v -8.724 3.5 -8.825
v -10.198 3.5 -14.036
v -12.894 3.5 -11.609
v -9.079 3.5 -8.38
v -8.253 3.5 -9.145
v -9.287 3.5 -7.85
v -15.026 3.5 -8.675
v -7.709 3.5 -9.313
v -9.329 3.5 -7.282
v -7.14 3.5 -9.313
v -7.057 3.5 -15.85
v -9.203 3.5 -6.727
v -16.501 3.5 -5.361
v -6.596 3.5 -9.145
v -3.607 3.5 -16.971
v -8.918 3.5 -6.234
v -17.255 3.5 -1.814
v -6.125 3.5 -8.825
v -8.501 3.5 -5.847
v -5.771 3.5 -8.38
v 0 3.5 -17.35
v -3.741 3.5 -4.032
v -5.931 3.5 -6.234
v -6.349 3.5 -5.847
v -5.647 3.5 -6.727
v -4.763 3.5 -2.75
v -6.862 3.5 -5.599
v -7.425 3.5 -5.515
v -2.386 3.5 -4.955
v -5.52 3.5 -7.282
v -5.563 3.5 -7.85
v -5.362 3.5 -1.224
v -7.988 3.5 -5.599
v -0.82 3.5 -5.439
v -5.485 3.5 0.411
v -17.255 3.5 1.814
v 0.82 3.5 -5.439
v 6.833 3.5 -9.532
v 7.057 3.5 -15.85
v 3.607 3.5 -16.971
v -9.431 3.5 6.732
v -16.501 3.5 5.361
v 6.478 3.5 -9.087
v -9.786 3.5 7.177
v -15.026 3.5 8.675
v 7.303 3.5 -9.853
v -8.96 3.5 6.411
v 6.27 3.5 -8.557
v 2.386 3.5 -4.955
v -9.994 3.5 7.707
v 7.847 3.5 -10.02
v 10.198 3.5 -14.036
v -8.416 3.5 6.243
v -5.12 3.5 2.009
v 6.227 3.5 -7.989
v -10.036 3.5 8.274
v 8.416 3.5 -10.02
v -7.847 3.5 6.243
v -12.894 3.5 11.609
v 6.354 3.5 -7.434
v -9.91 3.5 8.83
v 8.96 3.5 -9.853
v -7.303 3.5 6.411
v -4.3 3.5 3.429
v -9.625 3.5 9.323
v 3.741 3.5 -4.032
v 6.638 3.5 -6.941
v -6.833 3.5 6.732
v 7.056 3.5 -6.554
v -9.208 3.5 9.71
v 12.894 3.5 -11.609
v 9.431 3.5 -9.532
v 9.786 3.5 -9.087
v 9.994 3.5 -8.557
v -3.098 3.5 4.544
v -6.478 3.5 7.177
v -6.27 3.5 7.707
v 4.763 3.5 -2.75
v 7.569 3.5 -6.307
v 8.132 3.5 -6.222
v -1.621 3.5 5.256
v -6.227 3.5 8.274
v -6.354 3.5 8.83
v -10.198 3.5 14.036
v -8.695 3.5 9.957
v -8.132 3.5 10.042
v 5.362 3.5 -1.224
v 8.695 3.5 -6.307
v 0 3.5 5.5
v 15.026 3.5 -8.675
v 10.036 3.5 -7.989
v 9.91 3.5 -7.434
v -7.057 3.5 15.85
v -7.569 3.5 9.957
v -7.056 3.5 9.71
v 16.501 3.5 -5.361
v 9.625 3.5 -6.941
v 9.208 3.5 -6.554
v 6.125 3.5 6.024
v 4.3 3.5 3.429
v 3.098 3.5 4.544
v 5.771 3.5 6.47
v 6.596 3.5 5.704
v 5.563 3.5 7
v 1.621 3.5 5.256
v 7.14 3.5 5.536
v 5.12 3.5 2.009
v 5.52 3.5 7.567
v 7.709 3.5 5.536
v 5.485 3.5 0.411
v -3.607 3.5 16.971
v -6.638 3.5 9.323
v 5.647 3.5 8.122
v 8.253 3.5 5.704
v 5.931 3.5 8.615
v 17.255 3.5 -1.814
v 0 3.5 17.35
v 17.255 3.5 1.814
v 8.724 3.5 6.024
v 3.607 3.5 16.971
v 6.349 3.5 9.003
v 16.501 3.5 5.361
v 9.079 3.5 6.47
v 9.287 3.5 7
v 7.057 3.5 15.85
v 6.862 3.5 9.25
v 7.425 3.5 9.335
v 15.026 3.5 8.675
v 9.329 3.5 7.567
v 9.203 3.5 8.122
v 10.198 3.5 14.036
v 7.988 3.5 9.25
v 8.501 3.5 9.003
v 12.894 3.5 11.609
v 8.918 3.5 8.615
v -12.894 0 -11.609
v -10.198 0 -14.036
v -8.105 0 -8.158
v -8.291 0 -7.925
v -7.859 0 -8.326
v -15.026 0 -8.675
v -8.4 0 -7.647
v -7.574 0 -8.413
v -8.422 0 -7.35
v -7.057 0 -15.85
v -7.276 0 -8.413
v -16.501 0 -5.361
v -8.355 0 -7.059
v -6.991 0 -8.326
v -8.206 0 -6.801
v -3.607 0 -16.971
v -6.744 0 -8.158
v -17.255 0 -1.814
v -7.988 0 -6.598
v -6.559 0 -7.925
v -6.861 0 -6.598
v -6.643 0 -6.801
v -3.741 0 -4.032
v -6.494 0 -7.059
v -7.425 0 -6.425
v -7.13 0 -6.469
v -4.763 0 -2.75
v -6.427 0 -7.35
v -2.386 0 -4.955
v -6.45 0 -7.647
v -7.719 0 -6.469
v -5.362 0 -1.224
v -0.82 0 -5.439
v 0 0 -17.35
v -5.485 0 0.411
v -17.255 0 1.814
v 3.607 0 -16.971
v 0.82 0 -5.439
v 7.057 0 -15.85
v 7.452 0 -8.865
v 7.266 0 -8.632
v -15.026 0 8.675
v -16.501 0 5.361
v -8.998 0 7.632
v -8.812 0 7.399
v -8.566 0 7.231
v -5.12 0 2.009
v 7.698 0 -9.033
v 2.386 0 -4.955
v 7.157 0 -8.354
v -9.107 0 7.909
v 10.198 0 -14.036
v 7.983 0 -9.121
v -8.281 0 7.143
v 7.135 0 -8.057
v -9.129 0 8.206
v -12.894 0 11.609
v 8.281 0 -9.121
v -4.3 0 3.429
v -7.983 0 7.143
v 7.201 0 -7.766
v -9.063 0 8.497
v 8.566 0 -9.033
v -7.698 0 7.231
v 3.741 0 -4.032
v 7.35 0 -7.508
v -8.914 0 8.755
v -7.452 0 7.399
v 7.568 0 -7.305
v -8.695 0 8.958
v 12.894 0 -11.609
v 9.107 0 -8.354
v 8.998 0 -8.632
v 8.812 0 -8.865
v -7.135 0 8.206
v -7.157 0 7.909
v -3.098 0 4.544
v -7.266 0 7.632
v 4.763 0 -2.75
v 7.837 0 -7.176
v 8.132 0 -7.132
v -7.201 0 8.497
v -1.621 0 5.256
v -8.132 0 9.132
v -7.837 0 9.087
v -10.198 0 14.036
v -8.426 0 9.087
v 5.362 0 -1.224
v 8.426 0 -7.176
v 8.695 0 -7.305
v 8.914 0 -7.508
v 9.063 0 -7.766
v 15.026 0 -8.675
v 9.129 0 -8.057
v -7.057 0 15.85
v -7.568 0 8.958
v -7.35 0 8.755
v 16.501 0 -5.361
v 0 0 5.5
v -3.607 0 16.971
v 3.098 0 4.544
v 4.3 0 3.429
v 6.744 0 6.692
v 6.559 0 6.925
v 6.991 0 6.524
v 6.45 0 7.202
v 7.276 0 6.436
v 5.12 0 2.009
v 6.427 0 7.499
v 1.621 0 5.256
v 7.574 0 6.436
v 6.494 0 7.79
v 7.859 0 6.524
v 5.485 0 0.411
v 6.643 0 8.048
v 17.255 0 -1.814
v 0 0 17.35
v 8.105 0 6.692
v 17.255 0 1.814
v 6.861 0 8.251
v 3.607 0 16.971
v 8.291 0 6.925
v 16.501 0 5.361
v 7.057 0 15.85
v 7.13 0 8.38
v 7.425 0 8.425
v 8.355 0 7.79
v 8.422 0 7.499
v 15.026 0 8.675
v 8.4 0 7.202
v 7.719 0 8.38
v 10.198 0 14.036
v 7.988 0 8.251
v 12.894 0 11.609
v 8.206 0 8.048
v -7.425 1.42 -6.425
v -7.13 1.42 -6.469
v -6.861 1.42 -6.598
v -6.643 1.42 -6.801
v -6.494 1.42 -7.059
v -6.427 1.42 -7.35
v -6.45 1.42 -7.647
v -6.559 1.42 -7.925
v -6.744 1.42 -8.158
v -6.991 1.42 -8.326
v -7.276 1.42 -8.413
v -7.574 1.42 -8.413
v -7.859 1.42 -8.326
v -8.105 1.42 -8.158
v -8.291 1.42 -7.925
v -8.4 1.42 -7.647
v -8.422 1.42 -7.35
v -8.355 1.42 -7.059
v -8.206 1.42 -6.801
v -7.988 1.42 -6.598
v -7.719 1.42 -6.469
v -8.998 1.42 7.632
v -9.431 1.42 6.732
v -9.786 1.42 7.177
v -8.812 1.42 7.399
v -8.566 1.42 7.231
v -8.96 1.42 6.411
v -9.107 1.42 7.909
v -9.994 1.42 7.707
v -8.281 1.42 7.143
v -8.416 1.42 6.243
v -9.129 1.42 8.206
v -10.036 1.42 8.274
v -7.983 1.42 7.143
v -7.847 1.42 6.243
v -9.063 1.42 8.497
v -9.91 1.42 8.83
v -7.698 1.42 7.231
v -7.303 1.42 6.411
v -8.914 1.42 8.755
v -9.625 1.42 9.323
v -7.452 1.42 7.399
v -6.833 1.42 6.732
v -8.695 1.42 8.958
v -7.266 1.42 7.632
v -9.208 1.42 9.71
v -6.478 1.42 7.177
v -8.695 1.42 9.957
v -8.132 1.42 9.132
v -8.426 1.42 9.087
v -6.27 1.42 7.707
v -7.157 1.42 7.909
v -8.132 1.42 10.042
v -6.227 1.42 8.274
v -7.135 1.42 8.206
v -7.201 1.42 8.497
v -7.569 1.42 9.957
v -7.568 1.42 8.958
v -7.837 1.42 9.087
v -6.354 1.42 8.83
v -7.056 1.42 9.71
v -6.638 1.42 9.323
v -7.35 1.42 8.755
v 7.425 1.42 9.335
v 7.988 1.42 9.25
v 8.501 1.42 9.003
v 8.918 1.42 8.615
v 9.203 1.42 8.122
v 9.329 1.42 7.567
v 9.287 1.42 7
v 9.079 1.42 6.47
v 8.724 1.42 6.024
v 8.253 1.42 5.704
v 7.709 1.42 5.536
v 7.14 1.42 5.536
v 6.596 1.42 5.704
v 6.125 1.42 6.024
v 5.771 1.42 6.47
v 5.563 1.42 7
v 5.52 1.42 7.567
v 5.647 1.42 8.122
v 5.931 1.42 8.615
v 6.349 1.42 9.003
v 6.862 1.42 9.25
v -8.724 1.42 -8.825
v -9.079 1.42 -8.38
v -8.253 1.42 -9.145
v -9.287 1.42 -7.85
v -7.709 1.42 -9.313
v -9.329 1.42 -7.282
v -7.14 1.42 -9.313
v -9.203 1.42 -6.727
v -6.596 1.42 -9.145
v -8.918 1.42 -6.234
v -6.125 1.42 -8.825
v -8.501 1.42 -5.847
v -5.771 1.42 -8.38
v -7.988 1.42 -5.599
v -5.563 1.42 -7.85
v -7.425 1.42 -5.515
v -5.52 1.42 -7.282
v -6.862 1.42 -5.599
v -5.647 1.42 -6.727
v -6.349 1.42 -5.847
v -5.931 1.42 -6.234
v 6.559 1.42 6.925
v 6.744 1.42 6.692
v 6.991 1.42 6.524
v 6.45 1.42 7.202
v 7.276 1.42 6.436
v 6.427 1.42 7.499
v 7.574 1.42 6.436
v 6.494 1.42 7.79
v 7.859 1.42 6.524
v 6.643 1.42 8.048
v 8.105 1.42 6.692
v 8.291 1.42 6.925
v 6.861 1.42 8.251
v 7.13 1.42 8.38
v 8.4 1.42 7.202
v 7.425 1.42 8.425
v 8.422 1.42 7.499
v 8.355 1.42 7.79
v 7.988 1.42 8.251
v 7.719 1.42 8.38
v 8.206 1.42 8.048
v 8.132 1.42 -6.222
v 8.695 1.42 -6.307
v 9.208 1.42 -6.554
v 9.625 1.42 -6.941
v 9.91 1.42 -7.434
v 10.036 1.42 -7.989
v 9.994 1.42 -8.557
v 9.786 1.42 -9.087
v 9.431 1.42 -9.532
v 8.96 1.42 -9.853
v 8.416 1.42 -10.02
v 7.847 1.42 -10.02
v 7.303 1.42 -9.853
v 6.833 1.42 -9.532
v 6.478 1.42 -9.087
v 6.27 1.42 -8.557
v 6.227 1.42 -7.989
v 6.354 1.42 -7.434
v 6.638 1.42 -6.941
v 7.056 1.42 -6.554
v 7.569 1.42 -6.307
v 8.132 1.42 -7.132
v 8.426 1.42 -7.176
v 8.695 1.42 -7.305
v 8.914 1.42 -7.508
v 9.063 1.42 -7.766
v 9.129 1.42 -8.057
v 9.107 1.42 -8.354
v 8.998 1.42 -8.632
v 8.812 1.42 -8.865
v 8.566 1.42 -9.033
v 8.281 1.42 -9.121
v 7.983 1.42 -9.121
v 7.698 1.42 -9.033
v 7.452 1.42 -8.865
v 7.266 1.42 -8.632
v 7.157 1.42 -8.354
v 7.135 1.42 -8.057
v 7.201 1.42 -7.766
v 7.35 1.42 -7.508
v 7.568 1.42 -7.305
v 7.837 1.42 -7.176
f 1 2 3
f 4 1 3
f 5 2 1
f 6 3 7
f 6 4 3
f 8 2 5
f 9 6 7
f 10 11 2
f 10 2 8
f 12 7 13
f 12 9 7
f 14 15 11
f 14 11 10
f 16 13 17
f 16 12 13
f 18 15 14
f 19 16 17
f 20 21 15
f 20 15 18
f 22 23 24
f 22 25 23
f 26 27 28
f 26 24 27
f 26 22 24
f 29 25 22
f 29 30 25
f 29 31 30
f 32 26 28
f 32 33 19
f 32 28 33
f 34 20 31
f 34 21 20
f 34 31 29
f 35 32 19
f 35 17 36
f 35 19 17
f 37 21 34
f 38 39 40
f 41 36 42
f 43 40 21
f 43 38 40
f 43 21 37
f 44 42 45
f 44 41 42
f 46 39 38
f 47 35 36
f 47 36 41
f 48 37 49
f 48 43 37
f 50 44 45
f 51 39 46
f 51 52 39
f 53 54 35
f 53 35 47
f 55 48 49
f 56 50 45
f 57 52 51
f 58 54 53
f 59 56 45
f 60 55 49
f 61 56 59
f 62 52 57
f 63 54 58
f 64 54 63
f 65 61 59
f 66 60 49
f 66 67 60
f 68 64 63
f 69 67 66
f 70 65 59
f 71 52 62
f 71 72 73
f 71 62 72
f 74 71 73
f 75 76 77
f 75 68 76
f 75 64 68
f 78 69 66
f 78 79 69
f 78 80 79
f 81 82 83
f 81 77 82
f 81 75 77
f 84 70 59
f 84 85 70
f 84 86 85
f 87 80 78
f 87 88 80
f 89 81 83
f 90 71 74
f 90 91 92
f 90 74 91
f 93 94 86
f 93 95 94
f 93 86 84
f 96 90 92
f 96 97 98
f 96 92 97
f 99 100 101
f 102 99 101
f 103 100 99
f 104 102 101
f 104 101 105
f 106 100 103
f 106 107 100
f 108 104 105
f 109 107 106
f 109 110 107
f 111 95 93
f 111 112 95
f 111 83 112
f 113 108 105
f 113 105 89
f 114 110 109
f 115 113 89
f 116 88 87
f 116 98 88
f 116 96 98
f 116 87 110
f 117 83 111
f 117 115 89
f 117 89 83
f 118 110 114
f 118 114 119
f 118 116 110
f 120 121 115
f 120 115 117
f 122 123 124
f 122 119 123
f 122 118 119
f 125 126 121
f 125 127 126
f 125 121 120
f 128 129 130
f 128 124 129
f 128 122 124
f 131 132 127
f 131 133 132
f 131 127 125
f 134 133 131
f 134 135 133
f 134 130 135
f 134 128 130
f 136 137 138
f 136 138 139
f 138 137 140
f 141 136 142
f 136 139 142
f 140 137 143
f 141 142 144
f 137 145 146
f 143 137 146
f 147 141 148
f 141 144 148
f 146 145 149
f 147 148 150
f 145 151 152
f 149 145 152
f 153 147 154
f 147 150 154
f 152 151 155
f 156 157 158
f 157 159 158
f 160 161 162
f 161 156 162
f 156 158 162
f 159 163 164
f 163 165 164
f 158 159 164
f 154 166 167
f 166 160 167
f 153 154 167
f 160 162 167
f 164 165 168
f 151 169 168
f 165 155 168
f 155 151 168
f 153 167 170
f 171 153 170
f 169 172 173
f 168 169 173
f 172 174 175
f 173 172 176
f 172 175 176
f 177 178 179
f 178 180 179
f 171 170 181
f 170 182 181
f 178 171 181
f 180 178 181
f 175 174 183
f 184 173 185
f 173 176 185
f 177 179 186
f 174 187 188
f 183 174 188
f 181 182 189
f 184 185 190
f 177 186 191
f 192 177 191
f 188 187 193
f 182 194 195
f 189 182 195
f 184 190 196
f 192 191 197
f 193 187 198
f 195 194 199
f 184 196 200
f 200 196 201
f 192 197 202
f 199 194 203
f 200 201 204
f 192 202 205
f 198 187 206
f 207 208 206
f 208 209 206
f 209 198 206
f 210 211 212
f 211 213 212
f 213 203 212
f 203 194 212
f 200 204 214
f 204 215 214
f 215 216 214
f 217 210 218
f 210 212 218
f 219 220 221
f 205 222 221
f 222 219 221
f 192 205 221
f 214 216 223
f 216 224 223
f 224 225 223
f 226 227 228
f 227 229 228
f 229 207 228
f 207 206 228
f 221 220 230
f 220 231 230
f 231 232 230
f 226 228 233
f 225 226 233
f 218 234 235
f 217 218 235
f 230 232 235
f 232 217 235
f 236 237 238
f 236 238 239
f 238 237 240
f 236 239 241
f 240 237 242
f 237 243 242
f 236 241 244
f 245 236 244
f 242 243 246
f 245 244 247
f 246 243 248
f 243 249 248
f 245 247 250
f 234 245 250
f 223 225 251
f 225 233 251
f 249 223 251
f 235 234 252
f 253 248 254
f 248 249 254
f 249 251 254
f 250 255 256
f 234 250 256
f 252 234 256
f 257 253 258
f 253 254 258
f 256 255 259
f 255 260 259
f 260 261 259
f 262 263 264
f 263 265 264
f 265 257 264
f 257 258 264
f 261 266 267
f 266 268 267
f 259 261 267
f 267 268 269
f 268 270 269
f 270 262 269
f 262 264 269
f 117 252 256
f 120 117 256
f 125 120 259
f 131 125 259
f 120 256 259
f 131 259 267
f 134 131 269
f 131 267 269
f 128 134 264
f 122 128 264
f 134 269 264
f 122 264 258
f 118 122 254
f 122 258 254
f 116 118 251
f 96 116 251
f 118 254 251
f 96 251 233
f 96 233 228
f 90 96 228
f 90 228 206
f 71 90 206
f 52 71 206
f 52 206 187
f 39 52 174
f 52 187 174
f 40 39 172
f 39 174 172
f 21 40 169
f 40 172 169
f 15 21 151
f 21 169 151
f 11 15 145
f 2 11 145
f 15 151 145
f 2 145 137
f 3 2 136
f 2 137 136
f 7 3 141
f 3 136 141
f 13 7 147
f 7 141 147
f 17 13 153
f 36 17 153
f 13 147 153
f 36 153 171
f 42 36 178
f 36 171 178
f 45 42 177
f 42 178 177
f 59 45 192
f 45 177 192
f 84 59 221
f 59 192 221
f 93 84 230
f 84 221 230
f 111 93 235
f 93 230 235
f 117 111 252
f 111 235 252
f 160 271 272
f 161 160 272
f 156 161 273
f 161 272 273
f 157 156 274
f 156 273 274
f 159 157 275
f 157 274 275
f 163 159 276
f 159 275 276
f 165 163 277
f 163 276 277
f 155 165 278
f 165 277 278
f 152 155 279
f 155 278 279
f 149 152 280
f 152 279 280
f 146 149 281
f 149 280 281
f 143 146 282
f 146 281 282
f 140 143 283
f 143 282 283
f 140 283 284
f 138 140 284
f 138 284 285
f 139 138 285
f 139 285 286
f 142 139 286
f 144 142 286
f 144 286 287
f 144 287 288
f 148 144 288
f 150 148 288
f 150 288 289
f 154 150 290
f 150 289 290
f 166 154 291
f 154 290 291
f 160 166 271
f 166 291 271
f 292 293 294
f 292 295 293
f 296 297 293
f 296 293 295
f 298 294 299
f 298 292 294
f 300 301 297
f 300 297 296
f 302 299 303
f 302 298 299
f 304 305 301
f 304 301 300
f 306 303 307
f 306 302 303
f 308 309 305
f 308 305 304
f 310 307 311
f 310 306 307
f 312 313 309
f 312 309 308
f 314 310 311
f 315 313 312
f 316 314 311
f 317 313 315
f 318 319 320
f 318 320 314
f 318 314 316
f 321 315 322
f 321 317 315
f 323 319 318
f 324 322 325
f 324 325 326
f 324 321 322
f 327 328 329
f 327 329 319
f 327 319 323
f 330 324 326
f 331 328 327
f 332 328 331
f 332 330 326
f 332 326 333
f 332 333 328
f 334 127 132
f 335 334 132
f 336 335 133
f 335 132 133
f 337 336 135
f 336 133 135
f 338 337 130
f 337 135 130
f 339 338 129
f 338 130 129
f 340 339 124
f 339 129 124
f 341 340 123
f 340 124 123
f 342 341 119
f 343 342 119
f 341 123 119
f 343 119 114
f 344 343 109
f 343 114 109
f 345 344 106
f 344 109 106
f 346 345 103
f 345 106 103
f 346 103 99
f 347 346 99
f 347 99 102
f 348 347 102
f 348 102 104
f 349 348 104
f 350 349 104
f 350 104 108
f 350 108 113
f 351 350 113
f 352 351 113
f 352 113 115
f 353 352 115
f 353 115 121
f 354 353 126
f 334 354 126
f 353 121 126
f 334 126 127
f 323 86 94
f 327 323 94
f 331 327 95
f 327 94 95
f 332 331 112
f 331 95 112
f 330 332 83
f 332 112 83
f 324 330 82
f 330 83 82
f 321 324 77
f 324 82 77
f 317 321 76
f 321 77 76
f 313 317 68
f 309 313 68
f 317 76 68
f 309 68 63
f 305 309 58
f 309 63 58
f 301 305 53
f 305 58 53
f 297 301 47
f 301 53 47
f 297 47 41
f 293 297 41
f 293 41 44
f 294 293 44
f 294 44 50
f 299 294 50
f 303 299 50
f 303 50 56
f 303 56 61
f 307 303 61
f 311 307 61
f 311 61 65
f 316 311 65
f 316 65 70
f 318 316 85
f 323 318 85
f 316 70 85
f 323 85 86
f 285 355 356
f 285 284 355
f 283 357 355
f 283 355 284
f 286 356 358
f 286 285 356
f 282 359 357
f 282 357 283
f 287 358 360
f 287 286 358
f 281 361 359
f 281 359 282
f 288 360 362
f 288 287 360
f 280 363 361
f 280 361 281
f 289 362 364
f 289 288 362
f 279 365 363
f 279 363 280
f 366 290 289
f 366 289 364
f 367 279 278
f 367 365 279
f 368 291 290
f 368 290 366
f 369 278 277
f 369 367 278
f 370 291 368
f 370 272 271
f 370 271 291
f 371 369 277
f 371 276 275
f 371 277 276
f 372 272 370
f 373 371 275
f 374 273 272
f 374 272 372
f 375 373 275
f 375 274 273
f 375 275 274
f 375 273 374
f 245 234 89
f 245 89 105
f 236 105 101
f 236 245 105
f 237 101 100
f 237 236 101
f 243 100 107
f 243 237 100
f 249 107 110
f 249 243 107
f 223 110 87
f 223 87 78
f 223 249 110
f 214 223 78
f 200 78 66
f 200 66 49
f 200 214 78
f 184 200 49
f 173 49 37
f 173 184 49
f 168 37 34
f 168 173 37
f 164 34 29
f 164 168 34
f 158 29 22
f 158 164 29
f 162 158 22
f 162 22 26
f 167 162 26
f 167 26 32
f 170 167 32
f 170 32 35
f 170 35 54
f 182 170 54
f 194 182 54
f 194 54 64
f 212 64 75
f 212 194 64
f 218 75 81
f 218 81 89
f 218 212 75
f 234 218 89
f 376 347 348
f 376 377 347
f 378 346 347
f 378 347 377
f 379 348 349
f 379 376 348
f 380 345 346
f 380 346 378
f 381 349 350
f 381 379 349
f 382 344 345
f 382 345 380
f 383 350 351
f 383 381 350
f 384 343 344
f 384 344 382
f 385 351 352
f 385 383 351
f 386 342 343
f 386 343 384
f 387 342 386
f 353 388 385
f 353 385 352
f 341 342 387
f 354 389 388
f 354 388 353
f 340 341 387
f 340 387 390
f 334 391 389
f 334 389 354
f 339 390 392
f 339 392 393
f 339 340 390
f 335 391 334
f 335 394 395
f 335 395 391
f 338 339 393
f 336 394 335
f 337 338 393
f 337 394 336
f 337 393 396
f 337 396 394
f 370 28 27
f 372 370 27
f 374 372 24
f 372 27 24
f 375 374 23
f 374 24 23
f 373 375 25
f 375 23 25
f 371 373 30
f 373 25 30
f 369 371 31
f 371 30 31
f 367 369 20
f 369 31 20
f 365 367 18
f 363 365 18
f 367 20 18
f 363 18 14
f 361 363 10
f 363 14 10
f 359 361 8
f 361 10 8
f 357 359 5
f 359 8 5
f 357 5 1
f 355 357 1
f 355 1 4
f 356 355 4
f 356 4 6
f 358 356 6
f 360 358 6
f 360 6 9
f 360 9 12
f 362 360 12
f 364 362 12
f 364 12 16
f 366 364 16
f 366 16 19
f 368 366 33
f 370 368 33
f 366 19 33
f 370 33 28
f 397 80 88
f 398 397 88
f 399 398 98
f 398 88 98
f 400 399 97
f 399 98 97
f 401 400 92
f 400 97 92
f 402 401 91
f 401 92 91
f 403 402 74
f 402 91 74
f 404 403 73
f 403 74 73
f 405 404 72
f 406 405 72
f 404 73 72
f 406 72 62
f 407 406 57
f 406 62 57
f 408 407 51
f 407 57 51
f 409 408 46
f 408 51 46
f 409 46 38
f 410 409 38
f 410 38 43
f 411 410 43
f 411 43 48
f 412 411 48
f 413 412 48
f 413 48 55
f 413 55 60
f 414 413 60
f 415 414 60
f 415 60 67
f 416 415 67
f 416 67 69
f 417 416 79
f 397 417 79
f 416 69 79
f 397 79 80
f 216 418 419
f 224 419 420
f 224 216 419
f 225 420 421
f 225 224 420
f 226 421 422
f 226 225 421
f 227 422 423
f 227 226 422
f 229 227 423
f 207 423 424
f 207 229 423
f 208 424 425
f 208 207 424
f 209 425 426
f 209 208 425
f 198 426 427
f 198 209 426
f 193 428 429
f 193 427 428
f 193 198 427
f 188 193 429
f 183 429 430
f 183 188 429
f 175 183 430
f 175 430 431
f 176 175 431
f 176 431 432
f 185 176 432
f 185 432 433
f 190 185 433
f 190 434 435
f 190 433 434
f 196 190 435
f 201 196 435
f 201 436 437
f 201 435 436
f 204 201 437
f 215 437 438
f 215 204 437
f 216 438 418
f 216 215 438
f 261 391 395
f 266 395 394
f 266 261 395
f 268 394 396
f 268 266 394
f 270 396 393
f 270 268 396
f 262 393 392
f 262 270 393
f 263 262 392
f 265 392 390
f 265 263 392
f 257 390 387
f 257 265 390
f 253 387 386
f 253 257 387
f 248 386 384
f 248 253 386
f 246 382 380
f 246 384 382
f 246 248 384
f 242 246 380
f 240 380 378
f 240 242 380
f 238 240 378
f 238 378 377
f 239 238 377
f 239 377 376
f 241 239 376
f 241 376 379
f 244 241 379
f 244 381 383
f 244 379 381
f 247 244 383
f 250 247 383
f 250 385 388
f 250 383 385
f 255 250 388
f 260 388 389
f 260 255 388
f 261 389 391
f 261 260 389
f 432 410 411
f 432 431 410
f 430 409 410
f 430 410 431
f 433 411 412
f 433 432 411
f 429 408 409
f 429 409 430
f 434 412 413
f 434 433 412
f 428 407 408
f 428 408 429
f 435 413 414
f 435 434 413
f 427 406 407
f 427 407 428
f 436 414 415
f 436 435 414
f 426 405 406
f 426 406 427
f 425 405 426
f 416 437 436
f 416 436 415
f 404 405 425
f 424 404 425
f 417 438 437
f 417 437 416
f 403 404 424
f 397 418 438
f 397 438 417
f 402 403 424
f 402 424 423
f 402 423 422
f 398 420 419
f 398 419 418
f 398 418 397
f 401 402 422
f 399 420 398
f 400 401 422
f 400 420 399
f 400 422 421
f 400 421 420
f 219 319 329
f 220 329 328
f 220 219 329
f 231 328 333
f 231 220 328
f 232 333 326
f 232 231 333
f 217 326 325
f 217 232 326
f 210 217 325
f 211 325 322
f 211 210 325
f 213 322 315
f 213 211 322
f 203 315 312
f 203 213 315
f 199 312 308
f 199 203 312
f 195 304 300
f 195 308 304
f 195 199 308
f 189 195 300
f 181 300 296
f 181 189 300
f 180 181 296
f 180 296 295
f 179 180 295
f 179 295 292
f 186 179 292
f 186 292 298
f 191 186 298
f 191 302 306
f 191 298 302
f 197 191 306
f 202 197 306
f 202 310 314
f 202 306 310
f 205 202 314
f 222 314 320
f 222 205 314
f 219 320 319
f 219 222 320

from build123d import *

# Parameters (mm, degrees)
SKETCH_1_R          = 17.35
SKETCH_1_R_2        = 5.5
EXTRUDE_1_DEPTH     = 3.5
SKETCH_6_R          = 1
CUT_EXTRUDE_3_DEPTH = 5
SKETCH_7_R          = 1.91
CUT_EXTRUDE_4_DEPTH = 2.08


with BuildPart() as part:
    # 草图1 → 凸台-拉伸1 (new body)
    with BuildSketch(Plane(origin=(0, 0, 0), x_dir=(1, 0, 0), z_dir=(0, 1, 0))):
        with Locations(Location((0, 0, 0), (0, 0, 270))):
            Circle(SKETCH_1_R)
        with Locations(Location((0, 0, 0), (0, 0, 270))):
            Circle(SKETCH_1_R_2, mode=Mode.SUBTRACT)
    extrude(amount=EXTRUDE_1_DEPTH)

    # 草图6 → 切除-拉伸3 (cut, symmetric)
    with BuildSketch(Plane(origin=(0, 0, 0), x_dir=(1, 0, 0), z_dir=(0, 1, 0))):
        with Locations(Location((8.131727984, 8.131727984, 0), (0, 0, 270))):
            Circle(SKETCH_6_R)
        with Locations(Location((7.424621202, -7.424621202, 0), (0, 0, 270))):
            Circle(SKETCH_6_R)
        with Locations(Location((-8.131727984, -8.131727984, 0), (0, 0, 270))):
            Circle(SKETCH_6_R)
        with Locations(Location((-7.424621202, 7.424621202, 0), (0, 0, 270))):
            Circle(SKETCH_6_R)
    extrude(amount=CUT_EXTRUDE_3_DEPTH, both=True, mode=Mode.SUBTRACT)

    # 草图7 → 切除-拉伸4 (cut)
    with BuildSketch(Plane(origin=(0, 3.5, 0), x_dir=(1, 0, 0), z_dir=(0, 1, 0))):
        with Locations(Location((-7.424621202, 7.424621202, 0), (0, 0, 270))):
            Circle(SKETCH_7_R)
        with Locations(Location((8.131727984, 8.131727984, 0), (0, 0, 270))):
            Circle(SKETCH_7_R)
        with Locations(Location((7.424621202, -7.424621202, 0), (0, 0, 270))):
            Circle(SKETCH_7_R)
        with Locations(Location((-8.131727984, -8.131727984, 0), (0, 0, 270))):
            Circle(SKETCH_7_R)
    extrude(amount=-CUT_EXTRUDE_4_DEPTH, mode=Mode.SUBTRACT)


solid = part.part
